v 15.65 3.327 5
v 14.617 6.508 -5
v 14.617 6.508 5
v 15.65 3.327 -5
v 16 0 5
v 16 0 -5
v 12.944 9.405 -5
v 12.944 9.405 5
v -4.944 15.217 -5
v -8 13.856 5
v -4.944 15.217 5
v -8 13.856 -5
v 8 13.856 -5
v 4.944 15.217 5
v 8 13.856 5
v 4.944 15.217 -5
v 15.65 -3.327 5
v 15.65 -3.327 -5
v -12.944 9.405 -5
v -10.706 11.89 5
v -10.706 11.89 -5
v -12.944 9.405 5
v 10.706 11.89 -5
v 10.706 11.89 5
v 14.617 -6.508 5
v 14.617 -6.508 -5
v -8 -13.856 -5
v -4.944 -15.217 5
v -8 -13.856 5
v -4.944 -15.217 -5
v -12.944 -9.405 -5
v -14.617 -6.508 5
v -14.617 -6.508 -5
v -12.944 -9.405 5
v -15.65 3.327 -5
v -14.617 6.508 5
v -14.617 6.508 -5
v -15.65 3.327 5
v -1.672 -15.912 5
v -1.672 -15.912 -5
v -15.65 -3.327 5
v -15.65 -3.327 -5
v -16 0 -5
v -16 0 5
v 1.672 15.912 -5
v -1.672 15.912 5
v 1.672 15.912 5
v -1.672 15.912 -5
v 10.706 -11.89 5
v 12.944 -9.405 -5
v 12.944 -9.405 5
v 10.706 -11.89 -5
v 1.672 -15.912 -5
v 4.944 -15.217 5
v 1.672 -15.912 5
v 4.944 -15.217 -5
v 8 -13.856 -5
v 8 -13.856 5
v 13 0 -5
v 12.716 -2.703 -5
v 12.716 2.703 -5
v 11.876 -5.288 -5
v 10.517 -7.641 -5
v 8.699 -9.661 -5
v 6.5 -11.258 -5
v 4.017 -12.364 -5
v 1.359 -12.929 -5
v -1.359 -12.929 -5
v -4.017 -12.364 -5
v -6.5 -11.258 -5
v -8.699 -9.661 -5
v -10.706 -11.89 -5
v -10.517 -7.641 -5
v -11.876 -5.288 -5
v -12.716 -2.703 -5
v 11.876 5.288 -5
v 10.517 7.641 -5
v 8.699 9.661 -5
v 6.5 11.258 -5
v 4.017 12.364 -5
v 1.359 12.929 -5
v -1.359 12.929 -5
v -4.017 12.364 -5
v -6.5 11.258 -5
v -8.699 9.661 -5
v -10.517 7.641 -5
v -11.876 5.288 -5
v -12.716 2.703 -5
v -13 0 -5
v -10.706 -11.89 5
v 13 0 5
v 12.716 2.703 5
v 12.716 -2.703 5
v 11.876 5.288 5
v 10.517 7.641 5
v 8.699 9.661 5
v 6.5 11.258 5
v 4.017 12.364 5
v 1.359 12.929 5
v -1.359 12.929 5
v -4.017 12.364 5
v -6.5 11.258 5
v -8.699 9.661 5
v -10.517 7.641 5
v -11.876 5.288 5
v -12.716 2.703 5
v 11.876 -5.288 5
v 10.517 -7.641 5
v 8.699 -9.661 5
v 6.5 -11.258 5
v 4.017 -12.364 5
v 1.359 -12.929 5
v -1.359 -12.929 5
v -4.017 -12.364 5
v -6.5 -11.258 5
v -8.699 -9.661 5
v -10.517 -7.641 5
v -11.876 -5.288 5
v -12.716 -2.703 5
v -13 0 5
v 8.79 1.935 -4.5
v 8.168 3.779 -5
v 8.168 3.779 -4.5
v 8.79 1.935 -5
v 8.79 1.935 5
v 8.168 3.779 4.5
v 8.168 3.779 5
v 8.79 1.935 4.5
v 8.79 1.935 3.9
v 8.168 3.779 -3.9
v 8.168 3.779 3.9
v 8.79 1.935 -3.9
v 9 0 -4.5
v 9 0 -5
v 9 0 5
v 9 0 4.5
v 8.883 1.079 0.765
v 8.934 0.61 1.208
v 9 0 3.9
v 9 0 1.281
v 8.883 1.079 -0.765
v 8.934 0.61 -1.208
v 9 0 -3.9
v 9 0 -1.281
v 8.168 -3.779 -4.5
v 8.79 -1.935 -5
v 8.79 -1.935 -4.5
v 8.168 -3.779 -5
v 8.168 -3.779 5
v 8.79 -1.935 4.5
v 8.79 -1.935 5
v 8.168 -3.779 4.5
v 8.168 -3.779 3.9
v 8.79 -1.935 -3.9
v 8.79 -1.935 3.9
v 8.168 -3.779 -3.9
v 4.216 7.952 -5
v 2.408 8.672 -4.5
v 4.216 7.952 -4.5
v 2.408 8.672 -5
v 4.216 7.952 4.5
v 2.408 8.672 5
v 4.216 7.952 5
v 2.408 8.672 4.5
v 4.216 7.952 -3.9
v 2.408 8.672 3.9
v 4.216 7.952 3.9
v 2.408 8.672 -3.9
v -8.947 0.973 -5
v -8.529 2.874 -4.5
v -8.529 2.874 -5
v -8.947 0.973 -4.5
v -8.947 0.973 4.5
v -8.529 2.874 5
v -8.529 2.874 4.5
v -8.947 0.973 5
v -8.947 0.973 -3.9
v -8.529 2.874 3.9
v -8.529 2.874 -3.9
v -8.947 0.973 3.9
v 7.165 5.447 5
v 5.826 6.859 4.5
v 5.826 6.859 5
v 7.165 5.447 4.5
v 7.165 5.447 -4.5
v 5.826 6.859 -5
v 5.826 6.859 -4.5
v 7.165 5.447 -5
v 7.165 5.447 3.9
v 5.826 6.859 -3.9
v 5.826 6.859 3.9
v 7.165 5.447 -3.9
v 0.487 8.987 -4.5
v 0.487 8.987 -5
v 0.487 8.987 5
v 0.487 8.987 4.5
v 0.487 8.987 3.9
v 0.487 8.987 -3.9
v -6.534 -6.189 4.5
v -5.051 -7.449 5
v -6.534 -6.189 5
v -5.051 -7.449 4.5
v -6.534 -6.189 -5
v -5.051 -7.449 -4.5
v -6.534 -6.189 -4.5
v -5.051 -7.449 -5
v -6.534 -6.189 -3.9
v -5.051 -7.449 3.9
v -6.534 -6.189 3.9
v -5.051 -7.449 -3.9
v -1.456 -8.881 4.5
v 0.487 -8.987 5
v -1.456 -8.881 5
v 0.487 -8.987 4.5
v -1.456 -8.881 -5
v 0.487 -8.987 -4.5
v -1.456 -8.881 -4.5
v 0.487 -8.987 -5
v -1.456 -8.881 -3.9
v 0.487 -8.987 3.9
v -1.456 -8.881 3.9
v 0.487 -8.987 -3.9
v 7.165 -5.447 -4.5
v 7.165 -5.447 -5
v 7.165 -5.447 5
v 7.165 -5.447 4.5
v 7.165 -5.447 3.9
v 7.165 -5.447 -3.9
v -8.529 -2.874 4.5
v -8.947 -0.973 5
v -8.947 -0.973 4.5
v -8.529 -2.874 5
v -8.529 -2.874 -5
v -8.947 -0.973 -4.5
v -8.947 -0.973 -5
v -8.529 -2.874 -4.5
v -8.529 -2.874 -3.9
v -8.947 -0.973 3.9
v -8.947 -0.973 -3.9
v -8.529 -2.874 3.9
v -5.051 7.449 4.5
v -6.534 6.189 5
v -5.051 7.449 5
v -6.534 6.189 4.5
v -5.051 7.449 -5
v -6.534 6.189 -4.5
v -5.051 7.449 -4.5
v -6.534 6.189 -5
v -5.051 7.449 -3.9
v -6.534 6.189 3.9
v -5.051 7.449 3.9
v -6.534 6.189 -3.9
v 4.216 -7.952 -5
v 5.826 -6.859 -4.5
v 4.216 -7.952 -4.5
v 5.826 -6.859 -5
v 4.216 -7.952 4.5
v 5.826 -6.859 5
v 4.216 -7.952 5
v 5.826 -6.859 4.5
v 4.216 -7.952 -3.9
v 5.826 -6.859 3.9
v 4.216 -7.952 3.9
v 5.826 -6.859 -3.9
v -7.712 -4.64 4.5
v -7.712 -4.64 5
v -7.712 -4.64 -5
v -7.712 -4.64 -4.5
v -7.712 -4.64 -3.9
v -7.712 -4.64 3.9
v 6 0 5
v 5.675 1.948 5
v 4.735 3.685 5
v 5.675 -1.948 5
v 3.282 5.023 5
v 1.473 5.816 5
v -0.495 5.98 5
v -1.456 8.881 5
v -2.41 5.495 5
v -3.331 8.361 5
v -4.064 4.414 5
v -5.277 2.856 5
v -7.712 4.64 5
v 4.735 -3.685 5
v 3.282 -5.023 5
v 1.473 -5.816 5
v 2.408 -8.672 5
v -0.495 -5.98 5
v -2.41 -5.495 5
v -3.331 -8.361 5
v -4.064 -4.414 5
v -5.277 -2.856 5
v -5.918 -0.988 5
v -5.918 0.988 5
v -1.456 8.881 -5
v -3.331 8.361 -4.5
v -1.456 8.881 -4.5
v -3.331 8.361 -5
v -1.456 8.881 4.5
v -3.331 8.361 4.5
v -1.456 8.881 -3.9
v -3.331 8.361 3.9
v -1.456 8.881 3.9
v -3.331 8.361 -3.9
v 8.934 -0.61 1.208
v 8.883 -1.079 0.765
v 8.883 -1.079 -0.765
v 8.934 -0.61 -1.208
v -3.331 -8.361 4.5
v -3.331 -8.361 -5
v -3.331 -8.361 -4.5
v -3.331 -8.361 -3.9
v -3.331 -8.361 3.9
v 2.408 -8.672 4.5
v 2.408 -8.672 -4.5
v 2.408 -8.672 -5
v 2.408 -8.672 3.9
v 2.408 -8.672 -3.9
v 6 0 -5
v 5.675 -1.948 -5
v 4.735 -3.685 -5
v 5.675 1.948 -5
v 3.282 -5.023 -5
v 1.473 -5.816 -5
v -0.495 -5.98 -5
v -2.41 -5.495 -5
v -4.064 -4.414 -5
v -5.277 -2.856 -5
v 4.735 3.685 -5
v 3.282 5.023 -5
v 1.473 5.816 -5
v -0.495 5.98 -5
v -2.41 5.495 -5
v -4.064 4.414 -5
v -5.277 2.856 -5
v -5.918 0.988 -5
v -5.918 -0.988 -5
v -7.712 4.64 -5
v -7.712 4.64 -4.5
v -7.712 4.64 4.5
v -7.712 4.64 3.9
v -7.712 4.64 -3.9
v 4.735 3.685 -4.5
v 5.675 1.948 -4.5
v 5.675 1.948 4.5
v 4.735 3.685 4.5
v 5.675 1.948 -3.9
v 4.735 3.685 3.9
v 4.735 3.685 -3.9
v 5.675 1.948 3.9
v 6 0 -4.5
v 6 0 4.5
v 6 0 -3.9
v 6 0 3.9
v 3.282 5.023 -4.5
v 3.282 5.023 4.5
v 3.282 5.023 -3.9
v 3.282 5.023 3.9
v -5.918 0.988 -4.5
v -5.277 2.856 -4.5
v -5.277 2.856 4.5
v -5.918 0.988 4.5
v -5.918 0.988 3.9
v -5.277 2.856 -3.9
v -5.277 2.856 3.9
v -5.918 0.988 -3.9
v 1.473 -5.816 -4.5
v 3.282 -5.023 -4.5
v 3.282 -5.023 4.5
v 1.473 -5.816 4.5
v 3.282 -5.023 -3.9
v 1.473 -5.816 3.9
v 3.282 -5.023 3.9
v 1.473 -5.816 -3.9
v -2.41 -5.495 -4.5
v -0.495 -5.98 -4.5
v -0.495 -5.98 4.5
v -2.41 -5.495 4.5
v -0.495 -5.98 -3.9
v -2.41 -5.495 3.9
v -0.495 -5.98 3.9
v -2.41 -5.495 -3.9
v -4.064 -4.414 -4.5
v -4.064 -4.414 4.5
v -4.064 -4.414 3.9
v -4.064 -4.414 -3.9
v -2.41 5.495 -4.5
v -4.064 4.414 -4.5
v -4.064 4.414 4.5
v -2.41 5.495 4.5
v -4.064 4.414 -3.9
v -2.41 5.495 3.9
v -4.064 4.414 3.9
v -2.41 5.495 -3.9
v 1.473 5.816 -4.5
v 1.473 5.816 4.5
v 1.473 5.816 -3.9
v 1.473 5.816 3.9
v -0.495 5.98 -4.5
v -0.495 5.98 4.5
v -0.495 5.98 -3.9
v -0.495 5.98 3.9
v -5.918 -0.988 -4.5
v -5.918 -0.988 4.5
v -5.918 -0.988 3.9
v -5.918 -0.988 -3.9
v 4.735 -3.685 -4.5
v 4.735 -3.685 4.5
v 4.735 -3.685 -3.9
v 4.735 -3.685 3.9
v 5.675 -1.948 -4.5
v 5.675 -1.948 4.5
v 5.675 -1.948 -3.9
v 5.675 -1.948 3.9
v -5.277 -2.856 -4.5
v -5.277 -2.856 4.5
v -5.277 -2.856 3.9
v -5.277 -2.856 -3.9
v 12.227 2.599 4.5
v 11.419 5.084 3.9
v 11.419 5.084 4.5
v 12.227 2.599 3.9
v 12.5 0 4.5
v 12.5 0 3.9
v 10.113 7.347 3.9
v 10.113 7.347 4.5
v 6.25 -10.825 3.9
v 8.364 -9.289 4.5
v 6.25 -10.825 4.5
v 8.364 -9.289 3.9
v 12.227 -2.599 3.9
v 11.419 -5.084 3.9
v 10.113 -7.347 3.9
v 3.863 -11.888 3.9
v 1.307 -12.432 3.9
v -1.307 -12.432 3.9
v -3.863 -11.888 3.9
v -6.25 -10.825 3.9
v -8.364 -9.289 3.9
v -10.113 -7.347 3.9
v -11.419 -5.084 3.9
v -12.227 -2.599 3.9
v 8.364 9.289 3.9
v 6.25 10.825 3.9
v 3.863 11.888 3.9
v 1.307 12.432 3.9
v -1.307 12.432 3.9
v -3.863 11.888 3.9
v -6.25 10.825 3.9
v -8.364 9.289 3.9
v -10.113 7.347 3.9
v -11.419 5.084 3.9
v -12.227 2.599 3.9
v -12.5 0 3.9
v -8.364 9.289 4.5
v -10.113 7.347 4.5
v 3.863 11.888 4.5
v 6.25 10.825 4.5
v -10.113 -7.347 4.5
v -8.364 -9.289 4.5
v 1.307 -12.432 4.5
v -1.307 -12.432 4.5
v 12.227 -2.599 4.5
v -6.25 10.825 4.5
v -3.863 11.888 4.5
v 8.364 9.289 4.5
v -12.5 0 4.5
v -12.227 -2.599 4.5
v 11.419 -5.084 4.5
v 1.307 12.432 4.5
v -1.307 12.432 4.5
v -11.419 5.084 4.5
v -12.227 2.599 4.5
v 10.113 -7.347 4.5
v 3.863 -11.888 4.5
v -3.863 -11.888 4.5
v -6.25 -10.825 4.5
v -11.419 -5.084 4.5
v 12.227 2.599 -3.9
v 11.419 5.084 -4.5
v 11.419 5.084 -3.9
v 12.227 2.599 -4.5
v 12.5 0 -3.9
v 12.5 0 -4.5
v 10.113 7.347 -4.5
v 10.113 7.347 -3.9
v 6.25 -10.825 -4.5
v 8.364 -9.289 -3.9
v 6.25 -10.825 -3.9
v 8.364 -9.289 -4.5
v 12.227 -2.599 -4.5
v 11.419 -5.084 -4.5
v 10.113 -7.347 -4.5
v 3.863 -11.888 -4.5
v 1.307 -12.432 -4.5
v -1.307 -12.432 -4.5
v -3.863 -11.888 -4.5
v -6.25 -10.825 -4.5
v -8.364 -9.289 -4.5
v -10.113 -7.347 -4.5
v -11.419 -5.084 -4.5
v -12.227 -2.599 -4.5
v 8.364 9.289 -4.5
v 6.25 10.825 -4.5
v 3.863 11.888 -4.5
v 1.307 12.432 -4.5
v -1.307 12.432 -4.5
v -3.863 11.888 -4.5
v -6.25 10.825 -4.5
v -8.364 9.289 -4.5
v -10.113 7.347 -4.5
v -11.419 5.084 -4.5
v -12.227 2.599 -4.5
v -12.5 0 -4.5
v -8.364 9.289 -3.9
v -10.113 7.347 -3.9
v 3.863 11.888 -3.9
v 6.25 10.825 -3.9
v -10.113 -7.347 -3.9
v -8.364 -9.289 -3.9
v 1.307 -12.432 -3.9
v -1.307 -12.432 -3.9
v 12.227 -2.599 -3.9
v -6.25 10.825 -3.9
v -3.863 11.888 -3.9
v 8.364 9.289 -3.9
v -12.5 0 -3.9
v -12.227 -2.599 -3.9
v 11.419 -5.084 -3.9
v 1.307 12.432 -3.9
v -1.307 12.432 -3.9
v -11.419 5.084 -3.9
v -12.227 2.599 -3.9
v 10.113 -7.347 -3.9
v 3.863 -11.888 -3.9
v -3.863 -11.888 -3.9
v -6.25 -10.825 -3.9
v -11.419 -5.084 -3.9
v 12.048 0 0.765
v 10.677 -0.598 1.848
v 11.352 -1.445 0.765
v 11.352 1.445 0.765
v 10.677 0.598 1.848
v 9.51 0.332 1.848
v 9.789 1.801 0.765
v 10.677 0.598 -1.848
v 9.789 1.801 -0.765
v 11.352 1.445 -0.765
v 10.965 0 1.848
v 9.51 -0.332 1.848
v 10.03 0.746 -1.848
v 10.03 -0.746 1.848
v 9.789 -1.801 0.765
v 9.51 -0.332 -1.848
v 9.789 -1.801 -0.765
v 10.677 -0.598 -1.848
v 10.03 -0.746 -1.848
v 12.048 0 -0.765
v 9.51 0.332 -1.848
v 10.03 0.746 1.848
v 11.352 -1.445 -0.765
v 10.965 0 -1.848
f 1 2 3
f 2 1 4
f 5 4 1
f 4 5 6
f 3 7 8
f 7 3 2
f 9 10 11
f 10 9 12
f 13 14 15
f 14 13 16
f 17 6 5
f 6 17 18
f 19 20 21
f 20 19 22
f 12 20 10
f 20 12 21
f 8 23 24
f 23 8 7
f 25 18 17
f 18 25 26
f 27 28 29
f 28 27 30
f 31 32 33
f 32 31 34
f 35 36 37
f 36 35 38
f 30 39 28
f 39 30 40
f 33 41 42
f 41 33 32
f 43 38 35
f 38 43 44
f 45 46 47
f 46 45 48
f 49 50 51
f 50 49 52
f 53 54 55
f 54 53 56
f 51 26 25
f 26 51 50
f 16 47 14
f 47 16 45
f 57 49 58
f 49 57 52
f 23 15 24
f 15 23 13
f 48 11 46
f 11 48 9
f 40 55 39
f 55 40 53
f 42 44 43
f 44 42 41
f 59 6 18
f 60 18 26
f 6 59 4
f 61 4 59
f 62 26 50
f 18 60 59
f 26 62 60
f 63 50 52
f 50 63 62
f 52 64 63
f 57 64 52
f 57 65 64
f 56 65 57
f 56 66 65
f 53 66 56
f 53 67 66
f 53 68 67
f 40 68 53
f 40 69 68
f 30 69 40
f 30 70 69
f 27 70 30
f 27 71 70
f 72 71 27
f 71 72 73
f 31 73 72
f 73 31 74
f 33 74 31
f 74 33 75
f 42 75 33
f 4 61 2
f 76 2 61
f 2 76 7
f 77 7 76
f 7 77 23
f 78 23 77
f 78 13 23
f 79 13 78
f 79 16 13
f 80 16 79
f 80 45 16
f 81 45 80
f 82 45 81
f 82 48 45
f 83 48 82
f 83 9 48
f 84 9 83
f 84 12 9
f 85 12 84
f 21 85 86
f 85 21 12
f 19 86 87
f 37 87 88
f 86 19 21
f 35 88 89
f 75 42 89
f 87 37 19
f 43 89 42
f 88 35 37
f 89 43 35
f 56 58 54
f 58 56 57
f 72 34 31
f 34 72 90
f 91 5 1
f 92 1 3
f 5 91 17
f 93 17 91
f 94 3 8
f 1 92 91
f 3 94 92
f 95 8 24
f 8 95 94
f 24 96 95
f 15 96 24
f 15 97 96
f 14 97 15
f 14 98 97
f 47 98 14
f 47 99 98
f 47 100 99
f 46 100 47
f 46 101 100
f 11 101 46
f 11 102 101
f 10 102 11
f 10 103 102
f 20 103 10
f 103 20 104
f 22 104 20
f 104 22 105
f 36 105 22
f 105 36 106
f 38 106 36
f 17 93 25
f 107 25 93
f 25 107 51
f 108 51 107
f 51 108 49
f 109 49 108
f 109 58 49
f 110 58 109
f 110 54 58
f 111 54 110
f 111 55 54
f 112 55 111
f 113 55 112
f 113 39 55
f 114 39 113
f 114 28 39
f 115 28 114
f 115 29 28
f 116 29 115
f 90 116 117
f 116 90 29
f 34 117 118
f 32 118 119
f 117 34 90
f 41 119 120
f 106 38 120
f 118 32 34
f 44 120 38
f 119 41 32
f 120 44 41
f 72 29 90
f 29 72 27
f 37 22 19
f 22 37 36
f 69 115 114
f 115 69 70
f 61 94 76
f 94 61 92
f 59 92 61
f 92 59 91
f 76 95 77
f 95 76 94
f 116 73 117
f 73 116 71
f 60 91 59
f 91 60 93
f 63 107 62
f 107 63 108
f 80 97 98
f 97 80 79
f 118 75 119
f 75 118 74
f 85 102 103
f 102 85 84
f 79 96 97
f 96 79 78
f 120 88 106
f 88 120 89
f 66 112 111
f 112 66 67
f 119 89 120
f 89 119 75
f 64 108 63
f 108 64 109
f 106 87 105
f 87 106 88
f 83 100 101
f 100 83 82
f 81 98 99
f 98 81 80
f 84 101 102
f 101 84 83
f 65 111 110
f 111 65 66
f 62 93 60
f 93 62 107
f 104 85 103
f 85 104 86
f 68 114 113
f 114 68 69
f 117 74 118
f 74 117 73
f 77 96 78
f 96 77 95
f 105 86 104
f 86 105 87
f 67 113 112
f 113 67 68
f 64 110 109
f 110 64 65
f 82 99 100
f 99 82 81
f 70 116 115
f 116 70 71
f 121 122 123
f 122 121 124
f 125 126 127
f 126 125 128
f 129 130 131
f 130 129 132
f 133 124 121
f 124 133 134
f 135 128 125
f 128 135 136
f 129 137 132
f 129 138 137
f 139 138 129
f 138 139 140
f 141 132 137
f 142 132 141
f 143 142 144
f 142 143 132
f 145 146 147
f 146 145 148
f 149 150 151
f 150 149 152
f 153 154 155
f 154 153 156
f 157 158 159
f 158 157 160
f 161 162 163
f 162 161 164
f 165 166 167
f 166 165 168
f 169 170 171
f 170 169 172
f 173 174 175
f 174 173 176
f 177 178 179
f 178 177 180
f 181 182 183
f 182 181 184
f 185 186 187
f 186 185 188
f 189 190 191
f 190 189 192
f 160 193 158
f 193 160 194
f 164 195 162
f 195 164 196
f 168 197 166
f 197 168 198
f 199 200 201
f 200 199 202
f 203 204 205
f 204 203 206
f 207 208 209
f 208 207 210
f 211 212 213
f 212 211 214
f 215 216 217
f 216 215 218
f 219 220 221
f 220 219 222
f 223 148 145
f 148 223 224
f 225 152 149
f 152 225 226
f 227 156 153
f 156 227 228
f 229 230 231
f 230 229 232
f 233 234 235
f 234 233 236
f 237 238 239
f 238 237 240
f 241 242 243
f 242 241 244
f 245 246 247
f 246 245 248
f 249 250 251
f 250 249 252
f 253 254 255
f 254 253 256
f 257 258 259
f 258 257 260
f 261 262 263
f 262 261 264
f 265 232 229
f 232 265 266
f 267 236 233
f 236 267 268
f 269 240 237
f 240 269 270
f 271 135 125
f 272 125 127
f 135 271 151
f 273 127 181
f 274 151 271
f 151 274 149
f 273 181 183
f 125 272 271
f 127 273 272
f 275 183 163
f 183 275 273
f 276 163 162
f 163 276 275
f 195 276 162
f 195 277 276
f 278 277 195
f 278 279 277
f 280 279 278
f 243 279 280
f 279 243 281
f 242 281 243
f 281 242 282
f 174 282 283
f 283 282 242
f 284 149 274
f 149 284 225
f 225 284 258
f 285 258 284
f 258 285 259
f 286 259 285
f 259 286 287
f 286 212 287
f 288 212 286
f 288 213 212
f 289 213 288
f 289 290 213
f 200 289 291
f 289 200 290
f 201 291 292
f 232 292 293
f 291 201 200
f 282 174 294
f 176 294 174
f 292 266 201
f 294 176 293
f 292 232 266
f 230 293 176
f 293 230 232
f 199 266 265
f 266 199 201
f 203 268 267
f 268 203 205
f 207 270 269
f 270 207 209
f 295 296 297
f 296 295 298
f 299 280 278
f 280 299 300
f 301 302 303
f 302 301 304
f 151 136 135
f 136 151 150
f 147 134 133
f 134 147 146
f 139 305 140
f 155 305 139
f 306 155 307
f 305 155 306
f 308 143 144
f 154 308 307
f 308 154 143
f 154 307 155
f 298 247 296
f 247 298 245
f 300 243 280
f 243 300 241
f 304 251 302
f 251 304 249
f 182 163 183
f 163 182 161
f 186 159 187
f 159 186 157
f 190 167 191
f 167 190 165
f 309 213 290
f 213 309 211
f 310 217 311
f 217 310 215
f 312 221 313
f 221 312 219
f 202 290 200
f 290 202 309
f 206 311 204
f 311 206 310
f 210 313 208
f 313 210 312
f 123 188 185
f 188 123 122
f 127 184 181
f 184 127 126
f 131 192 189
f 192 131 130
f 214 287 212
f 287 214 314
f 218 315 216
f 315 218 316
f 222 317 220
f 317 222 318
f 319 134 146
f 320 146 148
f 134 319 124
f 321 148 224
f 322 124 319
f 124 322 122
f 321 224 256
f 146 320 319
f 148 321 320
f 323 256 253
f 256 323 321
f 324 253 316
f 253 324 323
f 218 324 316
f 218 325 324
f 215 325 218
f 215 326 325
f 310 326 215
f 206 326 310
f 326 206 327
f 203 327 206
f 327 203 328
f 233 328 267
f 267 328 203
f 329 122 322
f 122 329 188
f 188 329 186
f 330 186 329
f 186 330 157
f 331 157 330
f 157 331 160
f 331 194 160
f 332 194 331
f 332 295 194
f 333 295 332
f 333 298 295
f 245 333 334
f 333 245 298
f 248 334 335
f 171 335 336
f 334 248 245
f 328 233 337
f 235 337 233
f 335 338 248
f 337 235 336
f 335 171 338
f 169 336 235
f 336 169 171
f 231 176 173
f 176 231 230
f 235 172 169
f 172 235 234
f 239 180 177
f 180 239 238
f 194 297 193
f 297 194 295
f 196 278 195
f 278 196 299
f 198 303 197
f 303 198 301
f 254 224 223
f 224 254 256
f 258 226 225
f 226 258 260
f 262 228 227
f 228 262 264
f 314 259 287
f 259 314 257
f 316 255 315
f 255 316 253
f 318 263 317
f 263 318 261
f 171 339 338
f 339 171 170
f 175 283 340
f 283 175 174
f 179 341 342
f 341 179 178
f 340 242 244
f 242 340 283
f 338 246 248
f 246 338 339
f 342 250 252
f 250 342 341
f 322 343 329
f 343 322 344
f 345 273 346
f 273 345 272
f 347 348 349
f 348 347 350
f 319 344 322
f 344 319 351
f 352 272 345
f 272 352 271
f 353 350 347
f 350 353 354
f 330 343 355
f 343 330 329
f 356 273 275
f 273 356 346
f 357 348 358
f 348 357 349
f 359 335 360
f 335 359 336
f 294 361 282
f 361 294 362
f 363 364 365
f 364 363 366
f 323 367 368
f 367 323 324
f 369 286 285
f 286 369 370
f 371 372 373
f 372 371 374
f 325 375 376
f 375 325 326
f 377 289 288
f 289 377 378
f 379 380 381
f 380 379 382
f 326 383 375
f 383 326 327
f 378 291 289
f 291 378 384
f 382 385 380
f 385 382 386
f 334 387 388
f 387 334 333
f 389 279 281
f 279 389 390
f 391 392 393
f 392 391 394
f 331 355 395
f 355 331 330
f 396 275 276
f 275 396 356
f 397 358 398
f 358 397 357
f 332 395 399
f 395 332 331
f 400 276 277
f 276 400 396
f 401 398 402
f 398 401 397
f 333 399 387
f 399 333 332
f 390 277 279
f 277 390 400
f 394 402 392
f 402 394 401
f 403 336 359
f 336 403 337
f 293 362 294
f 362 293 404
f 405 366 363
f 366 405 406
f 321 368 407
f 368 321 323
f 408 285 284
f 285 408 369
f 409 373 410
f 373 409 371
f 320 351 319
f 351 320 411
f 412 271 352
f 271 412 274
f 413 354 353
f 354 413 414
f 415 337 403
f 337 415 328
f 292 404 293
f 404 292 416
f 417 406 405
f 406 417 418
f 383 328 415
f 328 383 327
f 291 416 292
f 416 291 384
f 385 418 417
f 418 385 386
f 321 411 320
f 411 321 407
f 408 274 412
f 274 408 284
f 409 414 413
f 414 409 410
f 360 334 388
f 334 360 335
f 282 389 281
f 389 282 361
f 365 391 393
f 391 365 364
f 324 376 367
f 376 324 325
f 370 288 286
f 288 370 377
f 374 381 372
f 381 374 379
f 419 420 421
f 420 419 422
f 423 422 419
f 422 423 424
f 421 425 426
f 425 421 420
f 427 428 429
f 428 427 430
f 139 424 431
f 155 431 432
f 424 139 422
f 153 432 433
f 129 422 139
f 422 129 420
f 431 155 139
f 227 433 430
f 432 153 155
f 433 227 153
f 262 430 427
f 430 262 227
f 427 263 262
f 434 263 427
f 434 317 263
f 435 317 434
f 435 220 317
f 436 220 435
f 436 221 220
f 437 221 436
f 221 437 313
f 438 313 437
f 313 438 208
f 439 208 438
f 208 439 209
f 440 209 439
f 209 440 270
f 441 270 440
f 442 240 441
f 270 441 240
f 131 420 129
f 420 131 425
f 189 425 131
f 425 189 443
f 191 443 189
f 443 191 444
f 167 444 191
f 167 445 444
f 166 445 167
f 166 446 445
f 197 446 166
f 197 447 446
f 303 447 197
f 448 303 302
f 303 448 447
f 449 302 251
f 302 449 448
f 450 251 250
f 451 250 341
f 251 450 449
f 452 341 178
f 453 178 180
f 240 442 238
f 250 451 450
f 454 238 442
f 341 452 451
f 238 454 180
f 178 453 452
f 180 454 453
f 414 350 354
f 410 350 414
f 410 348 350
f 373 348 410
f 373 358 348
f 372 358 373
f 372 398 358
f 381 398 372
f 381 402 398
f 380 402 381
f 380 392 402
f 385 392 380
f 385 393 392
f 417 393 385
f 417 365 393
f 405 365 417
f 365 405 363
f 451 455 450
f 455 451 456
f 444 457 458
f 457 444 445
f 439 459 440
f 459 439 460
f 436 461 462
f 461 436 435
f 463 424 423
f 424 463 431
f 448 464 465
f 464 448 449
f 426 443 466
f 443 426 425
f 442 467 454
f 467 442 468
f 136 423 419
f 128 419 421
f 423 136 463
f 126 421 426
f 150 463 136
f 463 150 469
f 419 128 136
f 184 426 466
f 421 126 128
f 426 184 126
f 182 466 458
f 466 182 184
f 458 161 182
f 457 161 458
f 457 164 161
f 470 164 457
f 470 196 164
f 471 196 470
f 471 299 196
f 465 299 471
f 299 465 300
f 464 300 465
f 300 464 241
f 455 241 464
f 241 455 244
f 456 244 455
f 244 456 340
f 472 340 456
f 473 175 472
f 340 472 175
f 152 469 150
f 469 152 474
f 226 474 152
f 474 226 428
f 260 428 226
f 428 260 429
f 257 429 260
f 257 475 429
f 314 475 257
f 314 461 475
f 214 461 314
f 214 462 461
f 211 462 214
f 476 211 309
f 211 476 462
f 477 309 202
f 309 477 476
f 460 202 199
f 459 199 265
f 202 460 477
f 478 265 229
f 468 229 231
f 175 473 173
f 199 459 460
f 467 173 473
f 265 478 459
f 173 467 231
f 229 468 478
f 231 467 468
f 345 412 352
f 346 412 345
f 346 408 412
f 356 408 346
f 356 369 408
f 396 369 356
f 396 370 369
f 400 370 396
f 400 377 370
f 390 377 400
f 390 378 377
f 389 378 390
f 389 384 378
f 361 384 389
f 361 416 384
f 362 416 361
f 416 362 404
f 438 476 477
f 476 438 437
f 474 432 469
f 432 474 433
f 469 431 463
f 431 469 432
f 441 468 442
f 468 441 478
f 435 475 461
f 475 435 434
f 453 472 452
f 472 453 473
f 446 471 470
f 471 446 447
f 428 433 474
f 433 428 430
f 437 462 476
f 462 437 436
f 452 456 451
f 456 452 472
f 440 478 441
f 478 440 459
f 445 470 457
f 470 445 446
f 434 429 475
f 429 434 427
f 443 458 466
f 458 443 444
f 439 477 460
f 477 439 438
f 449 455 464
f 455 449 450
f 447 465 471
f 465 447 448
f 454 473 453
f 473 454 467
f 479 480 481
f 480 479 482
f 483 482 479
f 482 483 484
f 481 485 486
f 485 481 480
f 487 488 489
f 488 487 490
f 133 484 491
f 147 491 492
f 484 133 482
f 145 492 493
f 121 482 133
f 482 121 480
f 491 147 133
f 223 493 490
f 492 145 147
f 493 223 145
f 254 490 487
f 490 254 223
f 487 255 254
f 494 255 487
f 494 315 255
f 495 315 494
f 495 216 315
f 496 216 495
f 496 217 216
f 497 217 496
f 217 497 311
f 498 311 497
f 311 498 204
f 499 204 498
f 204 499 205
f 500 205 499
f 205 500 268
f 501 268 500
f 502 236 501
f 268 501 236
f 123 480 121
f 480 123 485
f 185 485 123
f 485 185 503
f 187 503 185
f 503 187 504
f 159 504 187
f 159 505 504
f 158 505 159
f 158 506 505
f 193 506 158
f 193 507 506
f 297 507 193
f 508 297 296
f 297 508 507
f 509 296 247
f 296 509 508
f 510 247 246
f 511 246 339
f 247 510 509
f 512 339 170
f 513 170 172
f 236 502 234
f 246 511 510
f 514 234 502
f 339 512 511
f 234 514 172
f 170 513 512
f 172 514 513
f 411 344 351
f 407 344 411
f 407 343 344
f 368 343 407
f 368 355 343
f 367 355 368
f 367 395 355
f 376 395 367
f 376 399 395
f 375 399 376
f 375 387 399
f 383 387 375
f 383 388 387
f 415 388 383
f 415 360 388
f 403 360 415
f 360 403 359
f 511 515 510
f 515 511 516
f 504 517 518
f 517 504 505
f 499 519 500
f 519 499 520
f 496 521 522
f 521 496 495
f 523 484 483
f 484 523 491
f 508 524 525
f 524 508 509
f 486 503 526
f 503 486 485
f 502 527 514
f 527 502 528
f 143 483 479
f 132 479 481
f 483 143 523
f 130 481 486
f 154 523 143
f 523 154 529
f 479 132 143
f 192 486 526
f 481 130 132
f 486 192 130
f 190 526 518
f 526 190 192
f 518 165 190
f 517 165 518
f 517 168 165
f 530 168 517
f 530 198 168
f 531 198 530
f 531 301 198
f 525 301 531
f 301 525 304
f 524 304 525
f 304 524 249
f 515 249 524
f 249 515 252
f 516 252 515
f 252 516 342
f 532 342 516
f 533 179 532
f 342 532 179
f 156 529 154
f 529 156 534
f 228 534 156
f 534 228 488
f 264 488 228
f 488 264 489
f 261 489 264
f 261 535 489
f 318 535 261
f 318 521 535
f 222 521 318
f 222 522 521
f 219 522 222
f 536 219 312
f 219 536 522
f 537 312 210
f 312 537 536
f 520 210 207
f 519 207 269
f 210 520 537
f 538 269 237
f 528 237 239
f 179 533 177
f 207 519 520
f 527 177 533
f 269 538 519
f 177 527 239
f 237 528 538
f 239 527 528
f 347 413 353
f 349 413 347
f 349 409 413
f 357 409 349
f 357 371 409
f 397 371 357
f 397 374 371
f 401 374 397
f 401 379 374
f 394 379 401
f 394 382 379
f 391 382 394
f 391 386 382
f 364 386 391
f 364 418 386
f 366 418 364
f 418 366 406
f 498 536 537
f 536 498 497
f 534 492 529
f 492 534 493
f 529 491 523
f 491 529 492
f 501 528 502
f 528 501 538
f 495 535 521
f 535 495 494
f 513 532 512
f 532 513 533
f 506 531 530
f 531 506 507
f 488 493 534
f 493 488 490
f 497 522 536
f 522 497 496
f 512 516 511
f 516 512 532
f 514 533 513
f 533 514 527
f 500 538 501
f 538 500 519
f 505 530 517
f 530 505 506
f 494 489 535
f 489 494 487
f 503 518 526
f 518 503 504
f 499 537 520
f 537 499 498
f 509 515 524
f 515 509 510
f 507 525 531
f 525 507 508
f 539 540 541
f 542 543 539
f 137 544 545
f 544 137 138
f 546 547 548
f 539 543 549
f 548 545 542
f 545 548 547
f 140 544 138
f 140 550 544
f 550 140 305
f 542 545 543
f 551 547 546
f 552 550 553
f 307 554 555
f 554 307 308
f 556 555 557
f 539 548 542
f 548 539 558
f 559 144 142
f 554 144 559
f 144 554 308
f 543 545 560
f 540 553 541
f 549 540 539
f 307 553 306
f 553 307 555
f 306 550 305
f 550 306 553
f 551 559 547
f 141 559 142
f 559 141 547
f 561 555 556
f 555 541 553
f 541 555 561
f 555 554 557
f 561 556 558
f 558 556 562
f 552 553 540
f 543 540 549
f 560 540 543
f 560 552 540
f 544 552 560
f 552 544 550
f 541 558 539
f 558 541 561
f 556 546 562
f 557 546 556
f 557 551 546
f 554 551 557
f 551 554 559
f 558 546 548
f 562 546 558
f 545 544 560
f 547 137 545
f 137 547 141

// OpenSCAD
// Parameters
bore_diameter_mm = 12.0; //[6.0:24.0:0.1]
outer_diameter_mm = 32.0; //[16.0:64.0:0.1]
width_mm = 10.0; //[5.0:20.0:0.1]
bore_radius_mm = 6.0; //[3.0:12.0:0.1]
outer_radius_mm = 16.0; //[8.0:32.0:0.1]
race_radial_thickness_mm = 3.0; //[1.5:6.0:0.1]
shield_thickness_mm = 0.6; //[0.3:1.5:0.1]
shield_radial_clearance_mm = 0.5; //[0.2:1.5:0.1]
ball_diameter_mm = 4.0; //[2.0:8.0:0.1]
ball_radial_overlap_mm = 0.8; //[0.2:2.0:0.1]
connect_overlap_mm = 1.0; //[0.5:2.0:0.1]

// Outer Race
module outer_race() {
  color("Silver") difference() {
    cylinder(r=outer_diameter_mm/2, h=width_mm, center=true);
    cylinder(r=outer_diameter_mm/2 - race_radial_thickness_mm, h=width_mm + 2*connect_overlap_mm, center=true);
  }
}

// Inner Race
module inner_race() {
  color("Silver") difference() {
    cylinder(r=bore_diameter_mm/2 + race_radial_thickness_mm, h=width_mm, center=true);
    cylinder(r=bore_diameter_mm/2, h=width_mm + 2*connect_overlap_mm, center=true);
  }
}

// Shield Faces
module shield_faces() {
  color("DimGray") union() {
    translate([0, 0, width_mm/2 - shield_thickness_mm/2 - connect_overlap_mm/2])
      cylinder(r=outer_diameter_mm/2 - race_radial_thickness_mm - shield_radial_clearance_mm, h=shield_thickness_mm, center=true);
    translate([0, 0, -width_mm/2 + shield_thickness_mm/2 + connect_overlap_mm/2])
      cylinder(r=outer_diameter_mm/2 - race_radial_thickness_mm - shield_radial_clearance_mm, h=shield_thickness_mm, center=true);
  }
}

// Bearing Ball
module bearing_ball() {
  color("Copper") translate([
    bore_diameter_mm/2 + race_radial_thickness_mm + (outer_diameter_mm/2 - race_radial_thickness_mm - (bore_diameter_mm/2 + race_radial_thickness_mm))/2 - ball_radial_overlap_mm,
    0,
    0
  ]) sphere(r=ball_diameter_mm/2);
}

// Ball Bearing Assembly
module ball_bearing() {
  union() {
    outer_race();
    inner_race();
    shield_faces();
    bearing_ball();
  }
}

// Final Assembly
module assembly() {
  ball_bearing();
}

assembly();
